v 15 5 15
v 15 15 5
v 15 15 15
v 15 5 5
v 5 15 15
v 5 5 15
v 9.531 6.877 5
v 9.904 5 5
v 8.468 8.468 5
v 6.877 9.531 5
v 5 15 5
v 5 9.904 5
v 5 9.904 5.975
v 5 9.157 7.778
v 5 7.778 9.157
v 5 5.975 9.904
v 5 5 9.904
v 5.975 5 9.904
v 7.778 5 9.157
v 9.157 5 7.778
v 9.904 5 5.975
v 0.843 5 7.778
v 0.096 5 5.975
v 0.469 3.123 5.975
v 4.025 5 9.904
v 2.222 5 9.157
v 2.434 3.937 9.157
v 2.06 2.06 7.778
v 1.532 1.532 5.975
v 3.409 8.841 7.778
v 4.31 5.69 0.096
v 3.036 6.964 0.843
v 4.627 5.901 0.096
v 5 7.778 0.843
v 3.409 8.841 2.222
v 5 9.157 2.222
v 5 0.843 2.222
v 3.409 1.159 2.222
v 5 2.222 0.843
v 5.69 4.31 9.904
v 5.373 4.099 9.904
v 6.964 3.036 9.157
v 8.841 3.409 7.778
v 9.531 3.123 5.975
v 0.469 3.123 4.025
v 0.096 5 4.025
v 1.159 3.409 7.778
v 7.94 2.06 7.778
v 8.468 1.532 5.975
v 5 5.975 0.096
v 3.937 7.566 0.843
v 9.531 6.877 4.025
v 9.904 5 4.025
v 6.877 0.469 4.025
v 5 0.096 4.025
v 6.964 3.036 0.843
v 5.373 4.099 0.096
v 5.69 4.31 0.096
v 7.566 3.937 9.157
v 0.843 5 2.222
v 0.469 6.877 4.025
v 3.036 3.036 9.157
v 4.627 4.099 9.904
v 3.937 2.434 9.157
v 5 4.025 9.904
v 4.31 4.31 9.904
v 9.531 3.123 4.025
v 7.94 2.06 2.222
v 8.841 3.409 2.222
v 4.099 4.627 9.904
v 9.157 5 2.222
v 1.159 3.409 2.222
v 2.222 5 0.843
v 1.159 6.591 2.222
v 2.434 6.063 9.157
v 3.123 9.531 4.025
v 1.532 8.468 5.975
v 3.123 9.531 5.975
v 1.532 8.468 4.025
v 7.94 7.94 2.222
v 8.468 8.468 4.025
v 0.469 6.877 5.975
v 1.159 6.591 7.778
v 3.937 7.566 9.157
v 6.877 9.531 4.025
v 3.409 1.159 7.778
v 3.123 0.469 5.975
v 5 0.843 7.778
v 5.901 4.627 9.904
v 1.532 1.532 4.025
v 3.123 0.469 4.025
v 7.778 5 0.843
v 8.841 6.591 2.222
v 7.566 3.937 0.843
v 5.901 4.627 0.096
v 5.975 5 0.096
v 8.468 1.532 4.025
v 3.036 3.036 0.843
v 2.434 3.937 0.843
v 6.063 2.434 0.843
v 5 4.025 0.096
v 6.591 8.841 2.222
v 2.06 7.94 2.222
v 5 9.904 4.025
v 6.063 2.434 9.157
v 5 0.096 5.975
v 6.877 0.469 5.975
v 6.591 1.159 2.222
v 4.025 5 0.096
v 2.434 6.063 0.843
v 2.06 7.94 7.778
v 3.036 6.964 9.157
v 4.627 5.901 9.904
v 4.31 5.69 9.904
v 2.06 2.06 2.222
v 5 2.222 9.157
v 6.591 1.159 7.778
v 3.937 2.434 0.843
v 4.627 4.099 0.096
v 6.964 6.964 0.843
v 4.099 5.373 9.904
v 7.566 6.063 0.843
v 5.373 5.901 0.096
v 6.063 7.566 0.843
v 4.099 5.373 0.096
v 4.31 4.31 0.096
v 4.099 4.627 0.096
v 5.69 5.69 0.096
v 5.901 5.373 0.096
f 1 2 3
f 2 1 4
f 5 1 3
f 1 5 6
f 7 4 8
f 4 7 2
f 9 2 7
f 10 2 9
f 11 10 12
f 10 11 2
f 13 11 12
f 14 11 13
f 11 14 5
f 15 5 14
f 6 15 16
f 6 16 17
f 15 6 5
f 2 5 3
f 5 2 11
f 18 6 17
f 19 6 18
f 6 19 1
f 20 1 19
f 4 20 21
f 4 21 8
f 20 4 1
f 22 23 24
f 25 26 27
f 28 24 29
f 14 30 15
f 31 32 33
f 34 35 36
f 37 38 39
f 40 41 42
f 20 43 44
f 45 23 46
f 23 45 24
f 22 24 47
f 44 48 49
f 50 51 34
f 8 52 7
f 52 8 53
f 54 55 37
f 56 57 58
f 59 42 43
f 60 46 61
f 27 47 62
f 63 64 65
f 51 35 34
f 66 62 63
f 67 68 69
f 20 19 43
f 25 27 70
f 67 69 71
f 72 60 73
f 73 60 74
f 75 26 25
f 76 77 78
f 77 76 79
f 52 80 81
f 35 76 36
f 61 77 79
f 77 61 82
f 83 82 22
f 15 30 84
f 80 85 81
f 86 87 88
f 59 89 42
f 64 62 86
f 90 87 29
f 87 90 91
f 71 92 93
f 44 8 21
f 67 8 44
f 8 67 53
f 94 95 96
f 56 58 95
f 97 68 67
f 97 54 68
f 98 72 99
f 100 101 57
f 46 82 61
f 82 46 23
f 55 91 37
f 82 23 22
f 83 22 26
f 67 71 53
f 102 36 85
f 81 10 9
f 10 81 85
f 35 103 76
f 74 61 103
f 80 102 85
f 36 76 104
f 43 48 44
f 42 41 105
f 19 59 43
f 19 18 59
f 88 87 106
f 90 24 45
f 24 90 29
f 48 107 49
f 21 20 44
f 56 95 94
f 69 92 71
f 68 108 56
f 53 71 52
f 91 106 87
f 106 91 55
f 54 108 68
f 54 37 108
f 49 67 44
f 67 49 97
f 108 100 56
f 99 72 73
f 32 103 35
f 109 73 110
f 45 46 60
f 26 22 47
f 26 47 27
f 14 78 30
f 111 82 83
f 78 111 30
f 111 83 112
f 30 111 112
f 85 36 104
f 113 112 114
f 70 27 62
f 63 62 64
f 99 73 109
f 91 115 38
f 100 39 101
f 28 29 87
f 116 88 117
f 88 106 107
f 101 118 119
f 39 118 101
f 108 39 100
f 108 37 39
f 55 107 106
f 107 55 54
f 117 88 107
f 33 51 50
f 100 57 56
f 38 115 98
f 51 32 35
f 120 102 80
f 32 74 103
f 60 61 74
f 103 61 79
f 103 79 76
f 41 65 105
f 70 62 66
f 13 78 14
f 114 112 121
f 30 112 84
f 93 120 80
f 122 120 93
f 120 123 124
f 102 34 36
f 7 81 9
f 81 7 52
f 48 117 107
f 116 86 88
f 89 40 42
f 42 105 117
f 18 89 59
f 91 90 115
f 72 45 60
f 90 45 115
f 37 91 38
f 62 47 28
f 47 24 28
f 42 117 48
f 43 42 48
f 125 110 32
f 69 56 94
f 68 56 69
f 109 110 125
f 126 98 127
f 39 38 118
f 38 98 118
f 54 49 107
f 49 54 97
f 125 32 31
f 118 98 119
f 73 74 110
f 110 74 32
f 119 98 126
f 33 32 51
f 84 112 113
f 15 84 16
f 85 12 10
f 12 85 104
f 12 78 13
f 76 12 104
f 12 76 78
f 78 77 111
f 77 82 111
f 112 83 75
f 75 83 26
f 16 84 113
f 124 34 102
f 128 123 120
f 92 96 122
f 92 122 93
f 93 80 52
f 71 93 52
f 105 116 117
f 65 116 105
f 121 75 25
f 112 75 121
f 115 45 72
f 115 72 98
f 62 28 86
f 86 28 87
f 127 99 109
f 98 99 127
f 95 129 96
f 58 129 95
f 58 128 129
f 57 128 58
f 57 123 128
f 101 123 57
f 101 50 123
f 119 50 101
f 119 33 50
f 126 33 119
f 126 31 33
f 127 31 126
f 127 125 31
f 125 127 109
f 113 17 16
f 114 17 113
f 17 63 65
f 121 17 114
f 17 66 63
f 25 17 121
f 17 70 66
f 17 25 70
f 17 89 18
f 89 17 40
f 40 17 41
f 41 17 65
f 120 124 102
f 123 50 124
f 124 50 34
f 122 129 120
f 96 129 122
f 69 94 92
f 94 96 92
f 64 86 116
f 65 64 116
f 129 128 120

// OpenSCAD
translate([5, 5, 5]) union() {
    cube([10, 10, 10]);
    sphere(5);
}
